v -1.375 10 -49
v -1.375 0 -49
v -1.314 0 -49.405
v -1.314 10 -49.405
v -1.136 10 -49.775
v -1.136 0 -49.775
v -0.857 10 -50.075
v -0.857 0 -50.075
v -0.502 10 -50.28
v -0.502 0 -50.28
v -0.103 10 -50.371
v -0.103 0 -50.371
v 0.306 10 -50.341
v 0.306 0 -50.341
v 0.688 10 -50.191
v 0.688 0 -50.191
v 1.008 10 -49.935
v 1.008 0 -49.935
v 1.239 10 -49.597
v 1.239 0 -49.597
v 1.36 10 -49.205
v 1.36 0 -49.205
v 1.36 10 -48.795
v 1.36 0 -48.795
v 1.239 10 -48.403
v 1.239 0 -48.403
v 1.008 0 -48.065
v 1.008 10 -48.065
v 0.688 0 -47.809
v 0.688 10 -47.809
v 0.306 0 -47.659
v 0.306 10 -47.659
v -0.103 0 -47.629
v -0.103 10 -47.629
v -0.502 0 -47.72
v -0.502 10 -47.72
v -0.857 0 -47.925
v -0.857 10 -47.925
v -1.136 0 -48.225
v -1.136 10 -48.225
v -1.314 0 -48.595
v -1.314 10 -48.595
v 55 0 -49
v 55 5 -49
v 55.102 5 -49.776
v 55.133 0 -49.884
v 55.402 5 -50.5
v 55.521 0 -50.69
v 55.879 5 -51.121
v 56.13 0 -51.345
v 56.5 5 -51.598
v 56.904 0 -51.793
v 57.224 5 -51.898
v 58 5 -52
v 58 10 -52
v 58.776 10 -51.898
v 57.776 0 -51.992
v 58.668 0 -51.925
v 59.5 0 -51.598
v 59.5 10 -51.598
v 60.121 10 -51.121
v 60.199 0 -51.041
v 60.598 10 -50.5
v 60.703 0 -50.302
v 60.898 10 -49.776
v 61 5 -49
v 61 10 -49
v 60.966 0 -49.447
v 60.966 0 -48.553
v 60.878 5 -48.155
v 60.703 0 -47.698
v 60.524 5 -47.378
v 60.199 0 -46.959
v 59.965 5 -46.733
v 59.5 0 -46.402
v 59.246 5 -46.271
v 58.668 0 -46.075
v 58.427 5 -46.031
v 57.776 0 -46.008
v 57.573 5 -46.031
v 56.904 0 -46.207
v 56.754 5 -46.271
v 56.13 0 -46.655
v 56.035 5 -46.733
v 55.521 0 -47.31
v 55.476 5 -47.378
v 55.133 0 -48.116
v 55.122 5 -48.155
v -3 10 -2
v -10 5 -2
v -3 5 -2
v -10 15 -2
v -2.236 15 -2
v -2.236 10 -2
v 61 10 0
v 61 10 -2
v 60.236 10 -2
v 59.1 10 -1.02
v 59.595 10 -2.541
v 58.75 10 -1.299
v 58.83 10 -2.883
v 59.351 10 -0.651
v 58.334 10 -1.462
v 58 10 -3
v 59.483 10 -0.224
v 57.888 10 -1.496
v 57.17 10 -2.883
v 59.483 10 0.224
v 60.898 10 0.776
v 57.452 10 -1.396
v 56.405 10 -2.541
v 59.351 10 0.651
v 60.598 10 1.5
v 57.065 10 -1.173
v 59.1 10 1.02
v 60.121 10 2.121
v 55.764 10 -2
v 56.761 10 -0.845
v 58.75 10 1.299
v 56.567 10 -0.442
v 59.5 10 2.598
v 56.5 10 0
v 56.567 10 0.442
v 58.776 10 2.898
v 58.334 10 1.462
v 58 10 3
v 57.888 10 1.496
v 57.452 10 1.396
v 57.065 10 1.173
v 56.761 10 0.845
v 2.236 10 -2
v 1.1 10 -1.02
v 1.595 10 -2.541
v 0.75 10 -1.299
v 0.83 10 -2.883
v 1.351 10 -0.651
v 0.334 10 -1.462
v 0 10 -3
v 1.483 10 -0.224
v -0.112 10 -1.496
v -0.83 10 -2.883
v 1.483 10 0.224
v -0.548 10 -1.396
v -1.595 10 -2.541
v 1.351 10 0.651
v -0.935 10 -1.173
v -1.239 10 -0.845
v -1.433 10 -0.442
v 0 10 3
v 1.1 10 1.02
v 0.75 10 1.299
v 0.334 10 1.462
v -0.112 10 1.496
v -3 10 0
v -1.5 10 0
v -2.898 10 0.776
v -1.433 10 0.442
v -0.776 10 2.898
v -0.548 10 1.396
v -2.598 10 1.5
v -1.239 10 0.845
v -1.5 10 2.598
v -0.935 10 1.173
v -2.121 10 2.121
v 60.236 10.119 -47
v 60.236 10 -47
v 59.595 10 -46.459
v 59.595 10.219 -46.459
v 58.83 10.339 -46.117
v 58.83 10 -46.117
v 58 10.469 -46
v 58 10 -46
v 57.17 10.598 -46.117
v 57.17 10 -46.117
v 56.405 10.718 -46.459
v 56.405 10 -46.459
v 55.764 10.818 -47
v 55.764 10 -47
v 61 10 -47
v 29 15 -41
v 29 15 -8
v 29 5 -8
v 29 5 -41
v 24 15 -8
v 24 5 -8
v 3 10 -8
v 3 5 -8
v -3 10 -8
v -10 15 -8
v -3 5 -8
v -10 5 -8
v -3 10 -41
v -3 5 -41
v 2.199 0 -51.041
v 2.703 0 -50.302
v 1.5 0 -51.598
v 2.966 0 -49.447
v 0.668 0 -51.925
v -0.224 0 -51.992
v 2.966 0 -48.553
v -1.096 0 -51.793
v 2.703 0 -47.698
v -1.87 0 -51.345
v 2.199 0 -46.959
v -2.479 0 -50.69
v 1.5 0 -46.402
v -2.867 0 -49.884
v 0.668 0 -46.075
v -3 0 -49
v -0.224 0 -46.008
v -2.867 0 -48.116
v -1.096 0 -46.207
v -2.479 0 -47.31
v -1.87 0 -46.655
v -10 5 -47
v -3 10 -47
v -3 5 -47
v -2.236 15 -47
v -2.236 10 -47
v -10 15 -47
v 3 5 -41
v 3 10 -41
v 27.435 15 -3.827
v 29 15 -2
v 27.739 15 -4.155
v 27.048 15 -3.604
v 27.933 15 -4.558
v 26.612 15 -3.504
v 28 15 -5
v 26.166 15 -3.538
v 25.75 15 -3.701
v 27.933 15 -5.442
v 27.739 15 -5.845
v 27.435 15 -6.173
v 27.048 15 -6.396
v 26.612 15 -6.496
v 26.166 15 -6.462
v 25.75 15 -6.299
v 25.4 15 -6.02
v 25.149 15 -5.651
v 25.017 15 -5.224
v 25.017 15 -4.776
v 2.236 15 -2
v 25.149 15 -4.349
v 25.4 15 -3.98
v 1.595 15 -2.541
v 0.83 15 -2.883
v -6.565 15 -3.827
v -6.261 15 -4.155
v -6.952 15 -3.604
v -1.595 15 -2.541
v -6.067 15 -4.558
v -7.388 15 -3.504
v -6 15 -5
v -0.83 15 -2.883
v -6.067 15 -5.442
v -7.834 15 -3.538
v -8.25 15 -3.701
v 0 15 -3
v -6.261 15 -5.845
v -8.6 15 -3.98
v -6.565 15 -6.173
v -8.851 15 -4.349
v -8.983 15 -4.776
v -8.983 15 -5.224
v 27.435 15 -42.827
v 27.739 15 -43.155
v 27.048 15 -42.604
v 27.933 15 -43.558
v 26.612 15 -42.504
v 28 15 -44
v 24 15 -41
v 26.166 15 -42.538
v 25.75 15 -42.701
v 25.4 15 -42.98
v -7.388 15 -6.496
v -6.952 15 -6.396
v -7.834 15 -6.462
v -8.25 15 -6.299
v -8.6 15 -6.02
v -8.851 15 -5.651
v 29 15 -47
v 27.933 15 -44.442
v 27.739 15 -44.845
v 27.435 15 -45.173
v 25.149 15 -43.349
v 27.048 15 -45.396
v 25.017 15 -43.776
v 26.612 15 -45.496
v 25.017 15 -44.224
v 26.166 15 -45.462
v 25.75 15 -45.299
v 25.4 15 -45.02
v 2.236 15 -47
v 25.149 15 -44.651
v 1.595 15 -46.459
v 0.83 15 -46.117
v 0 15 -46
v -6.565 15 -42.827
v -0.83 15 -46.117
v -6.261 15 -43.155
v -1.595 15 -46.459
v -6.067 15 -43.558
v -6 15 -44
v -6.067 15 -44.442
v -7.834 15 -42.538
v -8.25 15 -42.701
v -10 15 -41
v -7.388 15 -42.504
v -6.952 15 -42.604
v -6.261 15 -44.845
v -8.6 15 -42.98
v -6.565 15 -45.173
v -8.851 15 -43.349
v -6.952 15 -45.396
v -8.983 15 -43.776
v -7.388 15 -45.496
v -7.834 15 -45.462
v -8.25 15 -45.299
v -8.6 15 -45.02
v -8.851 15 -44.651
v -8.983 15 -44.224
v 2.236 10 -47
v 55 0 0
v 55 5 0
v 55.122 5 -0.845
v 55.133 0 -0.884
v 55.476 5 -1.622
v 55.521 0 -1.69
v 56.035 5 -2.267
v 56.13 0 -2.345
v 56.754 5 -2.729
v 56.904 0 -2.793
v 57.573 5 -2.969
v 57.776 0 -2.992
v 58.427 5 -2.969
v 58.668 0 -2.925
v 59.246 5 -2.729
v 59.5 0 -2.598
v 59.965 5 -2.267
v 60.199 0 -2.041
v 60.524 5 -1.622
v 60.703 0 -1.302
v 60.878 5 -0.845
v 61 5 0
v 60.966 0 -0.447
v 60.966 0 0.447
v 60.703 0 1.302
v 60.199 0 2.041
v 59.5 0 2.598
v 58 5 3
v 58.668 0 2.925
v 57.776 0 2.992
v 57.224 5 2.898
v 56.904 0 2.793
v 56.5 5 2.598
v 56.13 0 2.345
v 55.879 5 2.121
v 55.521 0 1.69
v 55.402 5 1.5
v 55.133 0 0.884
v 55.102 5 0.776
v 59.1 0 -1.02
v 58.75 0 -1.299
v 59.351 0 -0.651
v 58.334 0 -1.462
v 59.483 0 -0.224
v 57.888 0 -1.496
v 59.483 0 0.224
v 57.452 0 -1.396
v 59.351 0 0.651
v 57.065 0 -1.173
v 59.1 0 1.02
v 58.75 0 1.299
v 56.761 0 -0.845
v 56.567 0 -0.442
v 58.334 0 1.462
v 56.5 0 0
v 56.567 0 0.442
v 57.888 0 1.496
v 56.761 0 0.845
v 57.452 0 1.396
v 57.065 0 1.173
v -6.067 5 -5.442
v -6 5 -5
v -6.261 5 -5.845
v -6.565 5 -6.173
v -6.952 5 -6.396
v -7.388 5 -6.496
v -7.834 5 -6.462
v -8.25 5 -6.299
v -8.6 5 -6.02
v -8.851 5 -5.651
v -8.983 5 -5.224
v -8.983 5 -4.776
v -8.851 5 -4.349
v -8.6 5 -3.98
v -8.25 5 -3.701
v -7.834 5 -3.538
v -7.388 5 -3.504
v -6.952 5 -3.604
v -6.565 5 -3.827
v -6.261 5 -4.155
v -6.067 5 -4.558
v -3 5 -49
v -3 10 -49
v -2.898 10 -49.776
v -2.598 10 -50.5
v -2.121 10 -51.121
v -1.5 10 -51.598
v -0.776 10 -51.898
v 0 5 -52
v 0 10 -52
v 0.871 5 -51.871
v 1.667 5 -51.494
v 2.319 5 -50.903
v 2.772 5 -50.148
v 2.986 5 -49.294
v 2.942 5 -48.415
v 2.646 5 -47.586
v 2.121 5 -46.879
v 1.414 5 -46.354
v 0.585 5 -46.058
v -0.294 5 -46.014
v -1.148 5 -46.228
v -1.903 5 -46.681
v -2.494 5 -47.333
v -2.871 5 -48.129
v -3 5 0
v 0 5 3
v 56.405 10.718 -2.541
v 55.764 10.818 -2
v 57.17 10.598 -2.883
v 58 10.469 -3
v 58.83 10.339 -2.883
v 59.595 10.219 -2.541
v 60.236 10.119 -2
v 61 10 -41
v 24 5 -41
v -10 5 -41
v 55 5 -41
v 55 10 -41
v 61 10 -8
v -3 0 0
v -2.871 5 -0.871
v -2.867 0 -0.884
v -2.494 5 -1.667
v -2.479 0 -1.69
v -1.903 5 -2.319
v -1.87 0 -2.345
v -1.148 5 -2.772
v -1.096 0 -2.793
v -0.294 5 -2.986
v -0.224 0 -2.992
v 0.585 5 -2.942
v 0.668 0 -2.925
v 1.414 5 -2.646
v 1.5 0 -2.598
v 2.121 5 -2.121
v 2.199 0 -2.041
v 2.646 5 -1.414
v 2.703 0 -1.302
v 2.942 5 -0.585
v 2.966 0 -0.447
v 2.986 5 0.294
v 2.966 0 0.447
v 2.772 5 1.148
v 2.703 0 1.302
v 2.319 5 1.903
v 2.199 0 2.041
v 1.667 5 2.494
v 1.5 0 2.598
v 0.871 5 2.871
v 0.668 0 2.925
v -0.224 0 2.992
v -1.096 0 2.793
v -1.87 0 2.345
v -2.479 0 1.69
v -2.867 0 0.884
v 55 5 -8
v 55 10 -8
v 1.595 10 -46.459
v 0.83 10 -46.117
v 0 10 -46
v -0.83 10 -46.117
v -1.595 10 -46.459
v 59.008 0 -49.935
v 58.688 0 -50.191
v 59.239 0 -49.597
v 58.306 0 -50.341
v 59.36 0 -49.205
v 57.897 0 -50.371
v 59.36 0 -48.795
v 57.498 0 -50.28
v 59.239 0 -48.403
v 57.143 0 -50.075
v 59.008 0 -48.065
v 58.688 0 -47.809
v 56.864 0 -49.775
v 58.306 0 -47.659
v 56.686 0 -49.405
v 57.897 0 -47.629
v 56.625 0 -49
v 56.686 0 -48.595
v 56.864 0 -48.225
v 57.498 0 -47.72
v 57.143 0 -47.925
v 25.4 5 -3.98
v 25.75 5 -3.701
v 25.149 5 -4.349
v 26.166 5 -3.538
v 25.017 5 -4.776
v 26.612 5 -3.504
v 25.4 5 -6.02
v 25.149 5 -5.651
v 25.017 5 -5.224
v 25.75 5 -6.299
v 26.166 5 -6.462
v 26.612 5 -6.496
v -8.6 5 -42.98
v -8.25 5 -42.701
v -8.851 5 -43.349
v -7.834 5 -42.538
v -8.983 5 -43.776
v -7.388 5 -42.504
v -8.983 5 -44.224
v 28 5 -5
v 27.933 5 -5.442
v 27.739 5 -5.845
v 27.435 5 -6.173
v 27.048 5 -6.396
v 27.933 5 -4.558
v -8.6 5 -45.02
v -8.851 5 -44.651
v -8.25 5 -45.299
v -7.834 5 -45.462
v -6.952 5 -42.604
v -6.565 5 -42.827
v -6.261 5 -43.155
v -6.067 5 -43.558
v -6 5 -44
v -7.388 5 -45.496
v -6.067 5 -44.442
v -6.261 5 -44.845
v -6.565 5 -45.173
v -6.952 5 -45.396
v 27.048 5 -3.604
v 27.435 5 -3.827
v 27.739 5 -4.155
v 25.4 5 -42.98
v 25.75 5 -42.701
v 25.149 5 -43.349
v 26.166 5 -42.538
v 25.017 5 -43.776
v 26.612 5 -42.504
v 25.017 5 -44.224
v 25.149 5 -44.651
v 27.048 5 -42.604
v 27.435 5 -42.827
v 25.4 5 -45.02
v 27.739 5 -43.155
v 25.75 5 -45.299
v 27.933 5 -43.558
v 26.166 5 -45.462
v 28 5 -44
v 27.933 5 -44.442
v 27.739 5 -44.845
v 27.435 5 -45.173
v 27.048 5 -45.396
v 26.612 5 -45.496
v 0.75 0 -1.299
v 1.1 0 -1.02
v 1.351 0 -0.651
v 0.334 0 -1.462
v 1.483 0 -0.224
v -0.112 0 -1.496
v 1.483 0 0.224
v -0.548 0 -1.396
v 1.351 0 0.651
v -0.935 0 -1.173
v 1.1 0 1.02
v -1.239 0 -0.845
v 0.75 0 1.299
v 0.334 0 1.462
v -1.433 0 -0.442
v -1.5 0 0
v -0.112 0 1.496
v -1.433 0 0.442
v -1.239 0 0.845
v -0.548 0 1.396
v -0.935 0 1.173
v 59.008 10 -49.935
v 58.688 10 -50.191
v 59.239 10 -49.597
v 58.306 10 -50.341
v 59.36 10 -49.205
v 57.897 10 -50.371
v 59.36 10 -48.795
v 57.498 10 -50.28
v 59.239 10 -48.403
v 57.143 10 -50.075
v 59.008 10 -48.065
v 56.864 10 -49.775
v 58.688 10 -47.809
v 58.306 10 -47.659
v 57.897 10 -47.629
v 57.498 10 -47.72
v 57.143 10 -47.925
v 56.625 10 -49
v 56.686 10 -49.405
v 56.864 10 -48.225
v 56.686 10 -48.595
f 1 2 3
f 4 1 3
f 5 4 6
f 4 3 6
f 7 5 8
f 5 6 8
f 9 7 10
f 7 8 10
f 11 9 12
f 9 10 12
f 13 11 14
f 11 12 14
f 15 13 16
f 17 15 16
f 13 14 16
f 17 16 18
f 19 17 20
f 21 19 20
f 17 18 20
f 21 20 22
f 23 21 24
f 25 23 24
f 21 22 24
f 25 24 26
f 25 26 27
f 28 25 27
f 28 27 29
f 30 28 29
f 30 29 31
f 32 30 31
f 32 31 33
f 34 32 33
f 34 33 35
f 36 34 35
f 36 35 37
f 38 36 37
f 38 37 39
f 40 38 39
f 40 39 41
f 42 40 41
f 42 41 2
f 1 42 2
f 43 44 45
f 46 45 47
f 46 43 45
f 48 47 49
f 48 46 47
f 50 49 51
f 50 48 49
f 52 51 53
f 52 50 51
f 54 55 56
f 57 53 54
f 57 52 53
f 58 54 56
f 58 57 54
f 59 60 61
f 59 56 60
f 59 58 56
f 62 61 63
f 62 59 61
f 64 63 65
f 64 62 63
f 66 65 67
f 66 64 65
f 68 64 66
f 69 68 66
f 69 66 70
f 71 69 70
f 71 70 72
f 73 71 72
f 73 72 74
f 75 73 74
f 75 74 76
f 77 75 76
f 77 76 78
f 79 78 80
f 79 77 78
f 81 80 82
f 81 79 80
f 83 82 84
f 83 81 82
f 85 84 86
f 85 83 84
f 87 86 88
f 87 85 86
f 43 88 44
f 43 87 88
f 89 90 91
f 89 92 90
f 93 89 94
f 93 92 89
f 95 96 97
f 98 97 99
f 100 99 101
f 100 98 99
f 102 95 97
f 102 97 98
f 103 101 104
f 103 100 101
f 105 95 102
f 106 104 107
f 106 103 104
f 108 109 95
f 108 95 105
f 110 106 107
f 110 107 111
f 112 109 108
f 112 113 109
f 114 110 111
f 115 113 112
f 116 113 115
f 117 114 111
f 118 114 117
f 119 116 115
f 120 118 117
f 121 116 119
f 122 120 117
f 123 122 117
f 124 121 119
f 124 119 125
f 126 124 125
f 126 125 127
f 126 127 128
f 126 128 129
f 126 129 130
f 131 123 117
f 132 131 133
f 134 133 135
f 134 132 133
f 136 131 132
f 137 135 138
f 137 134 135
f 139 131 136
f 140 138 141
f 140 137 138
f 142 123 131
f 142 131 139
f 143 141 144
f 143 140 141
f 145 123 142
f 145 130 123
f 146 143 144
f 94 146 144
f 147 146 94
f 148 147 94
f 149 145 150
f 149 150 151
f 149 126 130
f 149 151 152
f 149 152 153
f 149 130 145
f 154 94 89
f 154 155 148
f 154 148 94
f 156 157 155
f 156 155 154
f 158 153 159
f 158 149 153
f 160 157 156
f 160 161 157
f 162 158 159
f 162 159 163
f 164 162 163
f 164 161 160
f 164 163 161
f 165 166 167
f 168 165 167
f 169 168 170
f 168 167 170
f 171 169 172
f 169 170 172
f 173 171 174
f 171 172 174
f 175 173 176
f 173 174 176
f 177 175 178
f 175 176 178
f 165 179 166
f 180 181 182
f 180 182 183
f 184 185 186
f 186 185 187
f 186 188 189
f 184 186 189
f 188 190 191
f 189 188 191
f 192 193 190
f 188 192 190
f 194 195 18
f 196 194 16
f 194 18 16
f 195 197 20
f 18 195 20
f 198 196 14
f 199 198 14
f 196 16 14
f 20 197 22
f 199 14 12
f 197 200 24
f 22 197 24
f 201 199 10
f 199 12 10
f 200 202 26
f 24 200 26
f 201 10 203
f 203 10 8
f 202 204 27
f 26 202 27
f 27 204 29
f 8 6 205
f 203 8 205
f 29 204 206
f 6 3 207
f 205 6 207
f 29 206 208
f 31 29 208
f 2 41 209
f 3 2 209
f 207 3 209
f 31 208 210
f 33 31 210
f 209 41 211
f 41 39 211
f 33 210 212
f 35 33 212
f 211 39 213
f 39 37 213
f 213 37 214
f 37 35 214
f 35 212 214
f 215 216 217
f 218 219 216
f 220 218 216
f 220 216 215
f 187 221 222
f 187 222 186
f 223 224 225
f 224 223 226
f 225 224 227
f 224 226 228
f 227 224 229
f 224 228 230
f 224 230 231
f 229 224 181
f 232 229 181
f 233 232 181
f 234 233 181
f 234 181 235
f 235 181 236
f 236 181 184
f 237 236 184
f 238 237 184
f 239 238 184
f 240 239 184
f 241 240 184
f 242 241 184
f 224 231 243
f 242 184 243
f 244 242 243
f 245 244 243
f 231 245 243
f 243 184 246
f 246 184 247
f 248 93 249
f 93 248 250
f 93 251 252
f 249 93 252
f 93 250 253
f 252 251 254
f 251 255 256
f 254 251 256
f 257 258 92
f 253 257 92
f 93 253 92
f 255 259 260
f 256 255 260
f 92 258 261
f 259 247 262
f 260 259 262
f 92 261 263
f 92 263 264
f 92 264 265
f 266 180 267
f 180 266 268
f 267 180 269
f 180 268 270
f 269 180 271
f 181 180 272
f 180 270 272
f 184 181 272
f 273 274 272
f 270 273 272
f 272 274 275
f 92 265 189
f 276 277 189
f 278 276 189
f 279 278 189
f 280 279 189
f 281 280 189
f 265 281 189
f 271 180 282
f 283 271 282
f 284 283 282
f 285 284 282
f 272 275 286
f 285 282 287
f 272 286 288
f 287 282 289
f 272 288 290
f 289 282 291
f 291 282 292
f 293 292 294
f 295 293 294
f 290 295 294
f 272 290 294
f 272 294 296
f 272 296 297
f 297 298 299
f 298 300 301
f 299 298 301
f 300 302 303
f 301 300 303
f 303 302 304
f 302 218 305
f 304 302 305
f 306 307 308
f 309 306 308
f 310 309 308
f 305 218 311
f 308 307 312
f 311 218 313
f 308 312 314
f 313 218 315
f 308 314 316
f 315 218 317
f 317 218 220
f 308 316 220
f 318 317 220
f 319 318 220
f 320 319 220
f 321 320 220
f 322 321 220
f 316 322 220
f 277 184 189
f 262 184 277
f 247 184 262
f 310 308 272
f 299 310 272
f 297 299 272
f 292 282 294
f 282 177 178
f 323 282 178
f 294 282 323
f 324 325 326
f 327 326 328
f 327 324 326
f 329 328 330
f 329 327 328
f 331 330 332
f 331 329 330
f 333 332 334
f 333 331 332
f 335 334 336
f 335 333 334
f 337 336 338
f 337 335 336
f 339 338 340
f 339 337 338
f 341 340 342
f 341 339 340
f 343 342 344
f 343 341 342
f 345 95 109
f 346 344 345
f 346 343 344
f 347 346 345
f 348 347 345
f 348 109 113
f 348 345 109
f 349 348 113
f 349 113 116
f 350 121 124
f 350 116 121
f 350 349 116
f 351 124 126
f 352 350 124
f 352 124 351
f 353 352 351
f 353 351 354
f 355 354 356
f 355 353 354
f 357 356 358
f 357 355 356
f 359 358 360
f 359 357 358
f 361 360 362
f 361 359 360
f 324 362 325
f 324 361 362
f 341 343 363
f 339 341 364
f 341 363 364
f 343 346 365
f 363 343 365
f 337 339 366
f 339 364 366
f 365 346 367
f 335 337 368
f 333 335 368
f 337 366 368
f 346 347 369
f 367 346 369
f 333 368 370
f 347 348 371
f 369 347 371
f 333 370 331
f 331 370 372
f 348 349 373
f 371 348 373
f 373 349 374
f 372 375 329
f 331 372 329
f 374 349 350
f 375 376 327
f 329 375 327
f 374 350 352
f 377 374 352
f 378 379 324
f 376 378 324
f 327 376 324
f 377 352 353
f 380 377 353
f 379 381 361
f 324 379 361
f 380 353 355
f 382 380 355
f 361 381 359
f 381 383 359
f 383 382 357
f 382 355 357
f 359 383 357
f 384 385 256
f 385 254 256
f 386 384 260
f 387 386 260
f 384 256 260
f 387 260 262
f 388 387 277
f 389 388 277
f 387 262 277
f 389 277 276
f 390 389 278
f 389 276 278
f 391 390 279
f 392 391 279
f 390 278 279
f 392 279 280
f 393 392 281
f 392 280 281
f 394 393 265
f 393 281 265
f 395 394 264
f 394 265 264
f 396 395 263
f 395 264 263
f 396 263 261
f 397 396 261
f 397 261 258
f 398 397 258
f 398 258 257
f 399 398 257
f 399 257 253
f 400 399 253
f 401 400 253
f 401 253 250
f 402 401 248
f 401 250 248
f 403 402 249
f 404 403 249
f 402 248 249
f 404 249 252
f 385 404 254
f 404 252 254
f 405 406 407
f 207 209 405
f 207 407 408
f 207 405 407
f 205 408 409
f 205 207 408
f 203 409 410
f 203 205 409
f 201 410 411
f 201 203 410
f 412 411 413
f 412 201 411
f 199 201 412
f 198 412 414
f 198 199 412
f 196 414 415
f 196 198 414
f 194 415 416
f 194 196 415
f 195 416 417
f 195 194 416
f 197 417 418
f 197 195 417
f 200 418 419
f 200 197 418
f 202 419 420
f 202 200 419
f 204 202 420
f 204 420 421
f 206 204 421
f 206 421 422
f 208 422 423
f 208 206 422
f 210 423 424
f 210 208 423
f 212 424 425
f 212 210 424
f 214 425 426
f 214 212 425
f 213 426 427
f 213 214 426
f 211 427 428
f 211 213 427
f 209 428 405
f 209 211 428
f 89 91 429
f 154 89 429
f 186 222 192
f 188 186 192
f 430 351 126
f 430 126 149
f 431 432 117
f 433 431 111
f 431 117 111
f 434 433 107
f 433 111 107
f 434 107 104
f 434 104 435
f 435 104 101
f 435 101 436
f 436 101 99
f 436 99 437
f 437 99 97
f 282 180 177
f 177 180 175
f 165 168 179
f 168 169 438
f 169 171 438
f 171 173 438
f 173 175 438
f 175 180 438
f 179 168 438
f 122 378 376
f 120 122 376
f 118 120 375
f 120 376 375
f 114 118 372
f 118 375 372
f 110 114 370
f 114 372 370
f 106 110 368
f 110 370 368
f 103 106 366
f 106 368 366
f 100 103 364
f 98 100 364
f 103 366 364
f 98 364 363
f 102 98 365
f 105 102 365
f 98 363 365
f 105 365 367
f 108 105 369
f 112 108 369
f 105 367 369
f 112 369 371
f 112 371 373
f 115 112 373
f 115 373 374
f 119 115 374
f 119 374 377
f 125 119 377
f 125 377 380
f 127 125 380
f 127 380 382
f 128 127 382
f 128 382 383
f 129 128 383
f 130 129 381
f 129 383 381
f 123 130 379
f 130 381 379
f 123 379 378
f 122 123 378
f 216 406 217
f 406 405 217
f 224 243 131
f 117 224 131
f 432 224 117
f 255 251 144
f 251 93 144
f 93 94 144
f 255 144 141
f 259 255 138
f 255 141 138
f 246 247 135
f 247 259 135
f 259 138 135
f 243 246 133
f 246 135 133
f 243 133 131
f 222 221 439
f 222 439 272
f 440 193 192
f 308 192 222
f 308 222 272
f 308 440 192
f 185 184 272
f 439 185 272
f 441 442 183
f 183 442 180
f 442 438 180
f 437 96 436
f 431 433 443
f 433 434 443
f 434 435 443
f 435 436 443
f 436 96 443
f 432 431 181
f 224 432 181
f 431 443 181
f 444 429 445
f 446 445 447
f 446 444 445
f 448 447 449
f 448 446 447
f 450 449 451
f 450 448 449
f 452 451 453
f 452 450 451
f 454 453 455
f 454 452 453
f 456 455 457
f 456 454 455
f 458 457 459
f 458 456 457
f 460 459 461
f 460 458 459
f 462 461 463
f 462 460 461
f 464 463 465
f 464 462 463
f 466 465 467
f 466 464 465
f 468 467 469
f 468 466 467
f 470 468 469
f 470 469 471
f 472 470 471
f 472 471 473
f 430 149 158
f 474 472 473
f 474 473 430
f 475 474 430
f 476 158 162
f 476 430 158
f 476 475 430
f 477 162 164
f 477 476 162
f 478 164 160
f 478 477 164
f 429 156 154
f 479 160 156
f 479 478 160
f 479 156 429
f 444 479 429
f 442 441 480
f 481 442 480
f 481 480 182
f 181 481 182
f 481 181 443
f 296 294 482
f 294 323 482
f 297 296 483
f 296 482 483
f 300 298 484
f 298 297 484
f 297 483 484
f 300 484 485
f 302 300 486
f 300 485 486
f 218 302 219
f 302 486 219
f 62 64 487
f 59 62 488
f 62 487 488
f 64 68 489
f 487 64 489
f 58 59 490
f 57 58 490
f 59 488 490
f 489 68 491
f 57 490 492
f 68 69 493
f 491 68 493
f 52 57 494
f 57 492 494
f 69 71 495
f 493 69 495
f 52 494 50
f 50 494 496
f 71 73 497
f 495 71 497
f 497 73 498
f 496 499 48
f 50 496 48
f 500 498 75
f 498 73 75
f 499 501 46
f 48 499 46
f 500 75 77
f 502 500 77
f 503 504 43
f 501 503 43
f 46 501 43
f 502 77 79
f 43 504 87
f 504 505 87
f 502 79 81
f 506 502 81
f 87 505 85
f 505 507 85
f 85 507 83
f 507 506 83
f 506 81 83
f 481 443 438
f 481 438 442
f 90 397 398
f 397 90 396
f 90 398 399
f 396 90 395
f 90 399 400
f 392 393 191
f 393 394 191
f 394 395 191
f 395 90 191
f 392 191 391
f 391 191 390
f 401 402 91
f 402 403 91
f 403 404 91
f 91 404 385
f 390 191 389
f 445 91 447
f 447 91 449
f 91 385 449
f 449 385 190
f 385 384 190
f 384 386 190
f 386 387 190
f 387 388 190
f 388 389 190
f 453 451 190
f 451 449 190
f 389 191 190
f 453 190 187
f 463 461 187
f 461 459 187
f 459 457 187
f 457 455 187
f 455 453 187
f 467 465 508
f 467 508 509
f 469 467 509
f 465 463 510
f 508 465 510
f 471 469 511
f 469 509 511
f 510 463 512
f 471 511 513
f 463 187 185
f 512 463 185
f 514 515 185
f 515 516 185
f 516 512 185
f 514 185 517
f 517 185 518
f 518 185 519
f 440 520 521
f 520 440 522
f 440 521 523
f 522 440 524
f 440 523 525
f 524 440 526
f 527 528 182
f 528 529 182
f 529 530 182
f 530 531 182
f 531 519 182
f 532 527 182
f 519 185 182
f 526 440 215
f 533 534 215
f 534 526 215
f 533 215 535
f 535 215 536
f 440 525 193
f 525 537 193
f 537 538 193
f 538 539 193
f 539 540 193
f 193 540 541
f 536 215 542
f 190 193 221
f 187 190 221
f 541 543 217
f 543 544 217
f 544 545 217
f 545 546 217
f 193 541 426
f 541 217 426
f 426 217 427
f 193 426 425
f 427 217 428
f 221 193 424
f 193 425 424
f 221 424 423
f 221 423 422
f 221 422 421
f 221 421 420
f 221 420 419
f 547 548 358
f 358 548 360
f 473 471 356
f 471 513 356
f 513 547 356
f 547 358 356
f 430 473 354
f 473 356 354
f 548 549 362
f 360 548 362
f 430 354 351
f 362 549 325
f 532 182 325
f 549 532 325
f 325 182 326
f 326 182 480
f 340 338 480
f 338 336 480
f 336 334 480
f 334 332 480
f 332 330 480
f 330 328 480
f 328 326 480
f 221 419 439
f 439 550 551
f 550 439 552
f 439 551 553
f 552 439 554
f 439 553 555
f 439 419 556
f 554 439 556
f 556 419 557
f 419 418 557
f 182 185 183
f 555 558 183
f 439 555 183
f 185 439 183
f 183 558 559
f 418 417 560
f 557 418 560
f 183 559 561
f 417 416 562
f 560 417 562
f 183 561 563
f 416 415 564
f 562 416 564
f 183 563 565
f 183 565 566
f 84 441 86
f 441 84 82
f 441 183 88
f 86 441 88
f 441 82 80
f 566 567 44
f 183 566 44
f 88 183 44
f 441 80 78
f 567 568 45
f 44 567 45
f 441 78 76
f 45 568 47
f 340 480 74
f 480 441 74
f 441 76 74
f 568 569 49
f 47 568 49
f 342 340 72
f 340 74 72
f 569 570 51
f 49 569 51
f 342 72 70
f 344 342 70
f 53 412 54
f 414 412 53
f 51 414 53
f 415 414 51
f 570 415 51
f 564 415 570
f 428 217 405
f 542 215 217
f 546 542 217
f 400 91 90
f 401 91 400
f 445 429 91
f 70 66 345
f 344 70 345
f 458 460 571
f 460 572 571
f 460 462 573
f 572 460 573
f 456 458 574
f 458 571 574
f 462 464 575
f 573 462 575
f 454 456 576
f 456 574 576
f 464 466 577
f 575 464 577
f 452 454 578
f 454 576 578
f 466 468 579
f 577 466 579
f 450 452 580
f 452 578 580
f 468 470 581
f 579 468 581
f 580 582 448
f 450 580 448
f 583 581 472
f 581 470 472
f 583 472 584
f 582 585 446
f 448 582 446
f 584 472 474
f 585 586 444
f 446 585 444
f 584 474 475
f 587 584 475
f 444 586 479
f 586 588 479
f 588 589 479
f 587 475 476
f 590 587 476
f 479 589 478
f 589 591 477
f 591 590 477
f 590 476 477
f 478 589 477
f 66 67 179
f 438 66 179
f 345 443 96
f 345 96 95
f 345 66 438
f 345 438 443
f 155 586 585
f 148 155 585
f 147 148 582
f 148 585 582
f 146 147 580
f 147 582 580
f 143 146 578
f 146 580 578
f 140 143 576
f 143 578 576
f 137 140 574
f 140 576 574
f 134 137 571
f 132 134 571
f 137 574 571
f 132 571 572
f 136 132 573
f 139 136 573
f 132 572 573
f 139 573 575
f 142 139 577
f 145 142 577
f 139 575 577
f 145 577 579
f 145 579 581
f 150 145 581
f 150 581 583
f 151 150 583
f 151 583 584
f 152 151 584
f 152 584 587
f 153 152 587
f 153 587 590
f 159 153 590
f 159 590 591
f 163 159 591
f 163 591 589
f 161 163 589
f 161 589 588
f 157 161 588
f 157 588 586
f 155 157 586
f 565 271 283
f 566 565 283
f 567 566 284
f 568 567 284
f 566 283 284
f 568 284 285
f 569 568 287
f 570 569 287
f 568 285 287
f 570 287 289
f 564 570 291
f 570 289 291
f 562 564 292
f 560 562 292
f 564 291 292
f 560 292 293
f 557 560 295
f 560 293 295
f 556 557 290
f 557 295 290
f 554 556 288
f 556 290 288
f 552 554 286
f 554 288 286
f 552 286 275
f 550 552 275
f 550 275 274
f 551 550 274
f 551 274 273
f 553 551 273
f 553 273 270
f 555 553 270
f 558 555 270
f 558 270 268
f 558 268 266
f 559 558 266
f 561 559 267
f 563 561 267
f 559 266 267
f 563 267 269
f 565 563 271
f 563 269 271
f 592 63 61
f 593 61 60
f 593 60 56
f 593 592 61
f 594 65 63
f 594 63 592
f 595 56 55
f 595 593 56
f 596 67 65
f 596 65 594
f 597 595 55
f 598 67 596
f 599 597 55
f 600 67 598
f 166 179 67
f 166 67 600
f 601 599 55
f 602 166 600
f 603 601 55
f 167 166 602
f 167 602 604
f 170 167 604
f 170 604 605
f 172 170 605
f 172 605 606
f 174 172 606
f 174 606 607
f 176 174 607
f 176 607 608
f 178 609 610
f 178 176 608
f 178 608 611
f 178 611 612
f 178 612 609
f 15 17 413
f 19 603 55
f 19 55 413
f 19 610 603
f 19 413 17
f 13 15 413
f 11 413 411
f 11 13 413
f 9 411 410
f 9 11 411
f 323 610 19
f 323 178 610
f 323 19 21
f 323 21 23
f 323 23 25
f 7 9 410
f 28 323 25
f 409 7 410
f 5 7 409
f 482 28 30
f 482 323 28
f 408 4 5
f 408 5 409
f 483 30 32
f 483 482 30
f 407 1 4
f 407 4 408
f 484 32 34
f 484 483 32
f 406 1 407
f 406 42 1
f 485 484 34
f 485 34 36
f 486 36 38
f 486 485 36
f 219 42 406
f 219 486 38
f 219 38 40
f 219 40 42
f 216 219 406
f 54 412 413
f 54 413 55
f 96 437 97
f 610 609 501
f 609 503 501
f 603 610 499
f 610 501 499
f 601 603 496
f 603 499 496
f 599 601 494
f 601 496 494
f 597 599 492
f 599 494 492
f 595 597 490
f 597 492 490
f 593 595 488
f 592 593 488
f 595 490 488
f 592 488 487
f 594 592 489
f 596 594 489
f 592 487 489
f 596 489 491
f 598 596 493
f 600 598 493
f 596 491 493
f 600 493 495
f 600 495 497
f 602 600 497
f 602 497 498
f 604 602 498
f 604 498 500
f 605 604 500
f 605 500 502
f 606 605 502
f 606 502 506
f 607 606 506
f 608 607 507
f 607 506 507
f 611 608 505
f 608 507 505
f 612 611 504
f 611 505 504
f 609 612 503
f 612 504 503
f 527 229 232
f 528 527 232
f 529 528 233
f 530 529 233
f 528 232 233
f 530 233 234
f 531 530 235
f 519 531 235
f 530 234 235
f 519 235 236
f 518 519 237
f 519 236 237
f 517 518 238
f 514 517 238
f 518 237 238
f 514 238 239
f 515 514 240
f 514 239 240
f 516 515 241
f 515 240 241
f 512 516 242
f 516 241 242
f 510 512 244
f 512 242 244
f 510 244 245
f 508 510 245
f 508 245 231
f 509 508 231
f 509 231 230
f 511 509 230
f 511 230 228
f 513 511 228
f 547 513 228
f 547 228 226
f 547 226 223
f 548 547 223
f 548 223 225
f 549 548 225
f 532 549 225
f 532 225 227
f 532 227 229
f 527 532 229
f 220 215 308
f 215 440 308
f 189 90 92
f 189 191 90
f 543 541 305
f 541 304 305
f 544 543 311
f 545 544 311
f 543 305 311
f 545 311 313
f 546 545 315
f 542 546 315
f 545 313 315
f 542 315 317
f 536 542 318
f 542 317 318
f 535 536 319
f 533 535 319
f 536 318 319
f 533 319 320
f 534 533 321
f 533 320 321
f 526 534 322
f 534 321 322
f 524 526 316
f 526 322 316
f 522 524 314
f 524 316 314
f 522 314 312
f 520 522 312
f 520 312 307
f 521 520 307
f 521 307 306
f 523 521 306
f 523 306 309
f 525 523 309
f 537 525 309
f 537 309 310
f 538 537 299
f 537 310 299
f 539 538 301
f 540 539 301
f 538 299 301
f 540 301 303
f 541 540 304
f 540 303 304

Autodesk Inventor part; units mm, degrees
ref_plane "YZ Plane" through (0, 0, 0) normal (1, 0, 0) x (0, 1, 0)
ref_plane "XY Plane" through (0, 0, 0) normal (0, 0, 1) x (1, 0, 0)
sketch "Sketch1" plane through (0, 0, 0) normal (0, 1, 0) x (-1, 0, 0)
  circle A0 centre (0, 0) radius 1.5
  circle A1 centre (0, 0) radius 3
  circle A2 centre (-58, 0) radius 1.5
  circle A3 centre (-58, 0) radius 3
  circle A4 centre (0, -49) radius 1.375
  circle A5 centre (0, -49) radius 3
  circle A6 centre (-58, -49) radius 1.375
  circle A7 centre (-58, -49) radius 3
  dimension "d0" = 3
  dimension "d1" = 6
  dimension "d2" = 3
  dimension "d3" = 6
  dimension "d4" = 58
  dimension "d5" = 2.75
  dimension "d6" = 6
  dimension "d9" = 49
  dimension "d10" = 2.75
  dimension "d11" = 6
extrude "Extrusion1" add sketch "Sketch1" along normal blind 10
ref_plane "Work Plane1" through (0, 5, 0) normal (0, 1, 0) x (-1, 0, 0)
sketch "Sketch2" plane through (0, 5, 0) normal (0, 1, 0) x (-1, 0, 0)
  circle A0 centre (0, -49) radius 3 projected
  circle A1 centre (0, 0) radius 3 projected
  circle A2 centre (-58, 0) radius 3 projected
  circle A3 centre (-58, -49) radius 3 projected
  circle A4 centre (0, -49) radius 3 projected
  circle A5 centre (0, 0) radius 3 projected
  circle A6 centre (-58, -49) radius 3 projected
  circle A7 centre (0, -49) radius 1.375 projected
  circle A8 centre (-58, 0) radius 1.5 projected
  line L0 (3, -49) -> (3, 0)
  line L1 (0, -52) -> (-58, -52)
  line L2 (-61, -49) -> (-61, 0)
  circle A9 centre (-58, 0) radius 3 projected
  line L3 (-58, 3) -> (0, 3)
  line L4 (-3, -49) -> (-3, 0)
  line L5 (0, -46) -> (-58, -46)
  line L6 (-55, -49) -> (-55, 0)
  line L7 (-58, -3) -> (0, -3)
  line L8 (-55, -47) -> (-3, -47)
  line L9 (-55, -41) -> (-3, -41)
  line L10 (-55, -8) -> (-3, -8)
  line L11 (-55, -2) -> (-3, -2)
  line L12 (0, -46) -> (10, -46)
  line L13 (10, -46) -> (10, -41)
  line L14 (10, -41) -> (-3, -41)
  line L15 (-3, -8) -> (10, -8)
  line L16 (10, -8) -> (10, -3)
  line L17 (0, -3) -> (10, -3)
  line L18 (10, -41) -> (10, -8)
  line L19 (5, -41) -> (5, -8)
  line L20 (-24, -46) -> (-24, -8)
  line L21 (-29, -46) -> (-29, -8)
  point P0 (-3, -46)
  point P1 (-55, -46)
  point P2 (-55, -3)
  point P3 (-3, -3)
  point P4 (3, 0)
  point P5 (0, 3)
  point P6 (-61, 0)
  point P7 (-44, -3)
  point P8 (-39, -3)
  point P9 (3, -3)
  point P10 (3, -8)
  point P11 (-24, -41)
  point P12 (-29, -41)
  dimension "d23" = -1
  dimension "d25" = -1
  dimension "d45" = 39
  dimension "d46" = 10
  dimension "d47" = 5
  dimension "d48" = 34
  dimension "d49" = 5
  dimension "d77" = 5
  dimension "d78" = 5
extrude "Extrusion2" add sketch "Sketch2" along normal up to surface (5 mm away) contours A0 L12 L0 | A0 L4 L5 | L5 L4 L14 L0 L12 | L1 A3 L6 L8 L4 A0 | L0 L14 L13 L12 | L5 L20 L9 L4 | L14 L4 L15 L0 | L5 L21 L9 L20 | L2 A2 L7 L6 L5 A3 | A3 L5 L6 | L15 L4 L7 L17 L0 | L0 L17 L16 L15 | L19 L15 L18 L14 | L10 L6 L7 L4 | L9 L21 L10 L20 | L5 L6 L9 L21 | L17 A1 L0 | L4 A1 L7 | L3 A1 L4 L11 L6 A2 | A2 L6 L7
sketch "Sketch8" plane through (-10, 5, -3) normal (0, 0, 1) x (1, 0, 0)
  line L0 (7, 5) -> (0, 5) projected
  line L1 (10, 5) -> (7, 5) projected
  line L2 (68, 5) -> (10, 5) projected
  line L3 (71, 5) -> (68, 5) projected
  line L4 (39, 0) -> (39, 5) projected
  line L5 (39, 5) -> (39, 10)
  line L6 (39, 10) -> (71, 5)
  line L7 (0, 5) -> (7, 5) projected
  line L8 (0, 5) -> (0, 10)
  line L9 (0, 10) -> (39, 10)
  point P0 (10, -5)
  dimension "d50" = 5
  dimension "d51" = 5
extrude "Extrusion8" add sketch "Sketch8" against normal up to surface (5 mm away)
sketch "Sketch9" plane through (-3, 5, -46) normal (0, 0, -1) x (-1, 0, 0)
  line L0 (-32, 10) -> (7, 10) projected
  line L1 (-64, 5) -> (-32, 10) projected
  line L2 (-58, 5) -> (-64, 5) projected
  line L3 (-3, 5) -> (-61, 5) projected
  line L4 (0, 5) -> (-3, 5) projected
  line L5 (7, 5) -> (0, 5) projected
  line L6 (7, 10) -> (7, 5) projected
  point P0 (-3, -5)
extrude "Extrusion9" add sketch "Sketch9" against normal up to surface (5 mm away)
sketch "Sketch10" plane through (-10, 5, -46) normal (-1, 0, 0) x (0, 0, 1)
  line L0 (38, 5) -> (5, 5) projected
  line L1 (5, 5) -> (5, 10) projected
  line L2 (0, 10) -> (5, 10) projected
  line L3 (0, 0) -> (0, 10) projected
  line L4 (0, 0) -> (43, 0) projected
  line L5 (43, 0) -> (43, 10) projected
  line L6 (43, 10) -> (38, 10) projected
  line L7 (38, 10) -> (38, 5) projected
  line L8 (0, 10) -> (5, 10) projected
  line L9 (5, 10) -> (38, 10)
  point P0 (46, -5)
extrude "Extrusion10" add sketch "Sketch10" against normal up to surface (5 mm away) contours L0 L1 L9 L7
sketch "Sketch11" plane through (29, 5, -8) normal (1, 0, 0) x (0, 0, -1)
  line L0 (0, 10) -> (33, 10) projected
  line L1 (33, 5) -> (0, 5) projected
  line L2 (0, 0) -> (0, 10) projected
  line L3 (33, 0) -> (33, 10) projected
  point P0 (-8, -5)
extrude "Extrusion11" add sketch "Sketch11" against normal up to surface (5 mm away)
sketch "Sketch12" plane through (-10, 15, -3) normal (0, 1, 0) x (1, 0, 0)
  circle A0 centre (2.5, 2) radius 1.5
  circle A1 centre (2.5, 41) radius 1.5
  line L0 (0, 43) -> (0, 0) projected
  line L1 (39, 0) -> (0, 0) projected
  line L2 (0, 43) -> (39, 43) projected
  circle A2 centre (36.5, 2) radius 1.5
  circle A3 centre (36.5, 41) radius 1.5
  line L3 (39, 38) -> (39, 5) projected
  line L4 (5, 38) -> (34, 38) projected
  line L5 (34, 5) -> (5, 5) projected
  point P0 (10, -3)
  dimension "d60" = 3
  dimension "d61" = 3
  dimension "d62" = 2.5
  dimension "d64" = 2.5
  dimension "d66" = 3
  dimension "d67" = 3
  dimension "d69" = 2.5
  dimension "d70" = 2.5
  dimension "d79" = 39
  dimension "d80" = 39
  dimension "d81" = 3
  dimension "d82" = 3
  dimension "d83" = 3
  dimension "d84" = 3
extrude "Extrusion12" cut sketch "Sketch12" against normal up to surface (10 mm away)
sketch "Sketch13" plane through (-10, 5, -46) normal (-1, 0, 0) x (0, 0, 1)
  line L0 (5, 0) -> (5, 10) projected
  line L1 (38, 0) -> (38, 10) projected
  line L2 (0, 10) -> (43, 10) projected
  line L3 (0, 0) -> (43, 0) projected
  point P0 (46, -5)
extrude "Extrusion13" cut sketch "Sketch13" against normal blind 5
sketch "Sketch14" plane through (55, 5, -46) normal (0, 0, -1) x (-1, 0, 0)
  line L0 (0, 0) -> (0, 5) projected
  line L1 (0, 0) -> (52, 0) projected
  line L2 (52, 0) -> (52, 5) projected
  line L3 (58, 5) -> (52, 5) projected
  line L4 (58, 0) -> (58, 5) projected
  line L5 (58, 0) -> (65, 0) projected
  line L6 (65, 0) -> (65, 10) projected
  line L7 (65, 10) -> (26, 10) projected
  line L8 (26, 10) -> (-6, 5) projected
  line L9 (0, 5) -> (-6, 5) projected
  point P0 (55, -5)
extrude "Extrusion14" add sketch "Sketch14" along normal up to surface (1 mm away)
sketch "Sketch15" plane through (3, 5, -3) normal (0, 0, 1) x (1, 0, 0)
  line L0 (0, 0) -> (0, 5) projected
  line L1 (0, 0) -> (52, 0) projected
  line L2 (52, 0) -> (52, 5) projected
  line L3 (58, 5) -> (52, 5) projected
  line L4 (58, 5) -> (26, 10) projected
  line L5 (26, 10) -> (-13, 10) projected
  line L6 (-13, 0) -> (-13, 10) projected
  line L7 (-13, 0) -> (-6, 0) projected
  line L8 (-6, 0) -> (-6, 5) projected
  line L9 (0, 5) -> (-6, 5) projected
  point P0 (-3, -5)
extrude "Extrusion15" add sketch "Sketch15" along normal up to surface (1 mm away)
sketch "Sketch16" plane through (0, 10, 0) normal (0, 1, 0) x (1, 0, 0)
  circle A0 centre (0, 0) radius 1.5 projected
  circle A1 centre (0, 0) radius 3
  circle A2 centre (0, 49) radius 1.375 projected
  circle A3 centre (0, 49) radius 3
  circle A4 centre (58, 49) radius 1.375 projected
  circle A5 centre (58, 49) radius 3
  circle A6 centre (58, 0) radius 1.5 projected
  circle A7 centre (58, 0) radius 3
extrude "Extrusion16" cut sketch "Sketch16" along normal up to surface (5 mm away)
equation "\"d2\" = d0"
equation "\"d3\" = d1"
equation "\"d5\" = d7"
equation "\"d6\" = d8"
equation "\"d10\" = d12"
equation "\"d11\" = d13"
equation "\"d23\" = d25"
equation "\"d47\" = d21"
equation "\"d49\" = d21"
equation "\"d51\" = d50"
equation "\"d61\" = d60"
equation "\"d66\" = d60"
equation "\"d67\" = d60"
equation "\"d80\" = d79"
equation "\"d81\" = d82"
equation "\"d83\" = d82"
equation "\"d7\" = 2.75"
equation "\"d8\" = 6"
equation "\"d12\" = 2.75"
equation "\"d13\" = 6"
equation "\"d21\" = 5"
properties part number "Houder_RPI_v2"
